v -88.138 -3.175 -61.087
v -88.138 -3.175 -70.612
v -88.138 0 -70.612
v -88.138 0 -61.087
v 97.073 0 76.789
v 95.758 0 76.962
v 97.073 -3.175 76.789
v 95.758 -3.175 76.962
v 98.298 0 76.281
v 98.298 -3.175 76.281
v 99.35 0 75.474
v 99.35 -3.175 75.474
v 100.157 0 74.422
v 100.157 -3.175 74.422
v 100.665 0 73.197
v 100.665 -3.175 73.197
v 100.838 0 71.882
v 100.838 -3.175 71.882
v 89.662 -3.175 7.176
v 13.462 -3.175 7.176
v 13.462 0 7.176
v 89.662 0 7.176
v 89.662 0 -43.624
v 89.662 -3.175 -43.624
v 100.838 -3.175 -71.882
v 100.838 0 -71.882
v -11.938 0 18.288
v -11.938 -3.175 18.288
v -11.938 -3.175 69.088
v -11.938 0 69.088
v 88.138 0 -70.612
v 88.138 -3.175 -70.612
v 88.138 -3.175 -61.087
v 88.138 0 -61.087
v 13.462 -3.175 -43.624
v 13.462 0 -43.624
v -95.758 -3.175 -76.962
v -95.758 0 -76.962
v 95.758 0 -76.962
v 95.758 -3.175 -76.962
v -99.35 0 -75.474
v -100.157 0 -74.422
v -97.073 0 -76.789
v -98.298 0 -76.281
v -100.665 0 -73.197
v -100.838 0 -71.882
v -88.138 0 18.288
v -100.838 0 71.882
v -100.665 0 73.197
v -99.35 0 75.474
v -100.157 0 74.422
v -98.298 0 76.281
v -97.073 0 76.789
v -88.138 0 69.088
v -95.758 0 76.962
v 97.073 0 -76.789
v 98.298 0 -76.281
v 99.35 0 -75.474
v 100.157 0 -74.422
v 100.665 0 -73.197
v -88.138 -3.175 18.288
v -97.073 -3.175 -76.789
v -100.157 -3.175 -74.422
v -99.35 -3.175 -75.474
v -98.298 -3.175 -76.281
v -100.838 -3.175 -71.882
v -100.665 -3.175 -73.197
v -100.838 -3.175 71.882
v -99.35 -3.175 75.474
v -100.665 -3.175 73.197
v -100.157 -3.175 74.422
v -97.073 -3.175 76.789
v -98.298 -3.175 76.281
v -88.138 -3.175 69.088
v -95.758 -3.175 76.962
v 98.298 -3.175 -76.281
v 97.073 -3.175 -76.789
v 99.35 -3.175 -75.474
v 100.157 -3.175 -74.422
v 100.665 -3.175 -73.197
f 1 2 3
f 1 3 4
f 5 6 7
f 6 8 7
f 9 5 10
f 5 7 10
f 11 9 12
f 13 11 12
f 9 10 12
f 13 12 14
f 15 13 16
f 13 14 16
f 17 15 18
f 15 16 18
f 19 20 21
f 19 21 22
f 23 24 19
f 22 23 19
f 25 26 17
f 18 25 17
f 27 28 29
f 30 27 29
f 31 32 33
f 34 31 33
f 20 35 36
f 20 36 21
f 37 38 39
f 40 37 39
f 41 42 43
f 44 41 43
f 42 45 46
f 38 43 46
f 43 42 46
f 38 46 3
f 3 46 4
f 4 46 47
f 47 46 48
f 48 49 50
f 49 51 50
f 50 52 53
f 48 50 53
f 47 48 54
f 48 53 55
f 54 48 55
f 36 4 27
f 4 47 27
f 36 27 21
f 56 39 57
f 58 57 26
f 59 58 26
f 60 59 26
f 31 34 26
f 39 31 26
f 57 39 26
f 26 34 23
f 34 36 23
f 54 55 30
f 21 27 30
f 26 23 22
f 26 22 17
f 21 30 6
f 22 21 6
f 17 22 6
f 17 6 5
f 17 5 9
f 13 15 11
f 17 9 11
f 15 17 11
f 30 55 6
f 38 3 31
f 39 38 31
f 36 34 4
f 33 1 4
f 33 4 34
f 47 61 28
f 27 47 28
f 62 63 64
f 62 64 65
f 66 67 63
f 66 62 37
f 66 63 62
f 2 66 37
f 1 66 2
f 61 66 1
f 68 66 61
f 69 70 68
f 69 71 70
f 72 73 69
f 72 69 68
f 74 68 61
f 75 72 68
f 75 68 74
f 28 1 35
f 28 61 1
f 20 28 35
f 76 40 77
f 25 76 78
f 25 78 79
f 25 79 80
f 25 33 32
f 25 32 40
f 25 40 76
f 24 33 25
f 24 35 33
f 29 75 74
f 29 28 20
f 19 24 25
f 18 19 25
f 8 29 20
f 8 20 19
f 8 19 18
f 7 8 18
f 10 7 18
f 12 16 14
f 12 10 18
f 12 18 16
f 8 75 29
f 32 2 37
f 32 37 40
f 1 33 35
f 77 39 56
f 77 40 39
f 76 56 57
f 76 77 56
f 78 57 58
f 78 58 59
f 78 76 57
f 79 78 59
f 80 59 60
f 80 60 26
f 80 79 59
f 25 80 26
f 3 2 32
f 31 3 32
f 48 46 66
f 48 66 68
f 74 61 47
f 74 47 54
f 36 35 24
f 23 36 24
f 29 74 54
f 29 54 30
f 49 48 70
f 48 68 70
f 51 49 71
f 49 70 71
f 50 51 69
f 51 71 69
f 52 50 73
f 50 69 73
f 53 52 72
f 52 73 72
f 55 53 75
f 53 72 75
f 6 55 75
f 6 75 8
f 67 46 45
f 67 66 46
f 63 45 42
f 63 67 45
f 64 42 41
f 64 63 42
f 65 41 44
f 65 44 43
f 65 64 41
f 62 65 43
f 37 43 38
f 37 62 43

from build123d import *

# Parameters (mm, degrees)
F0_W     = 201.676
F0_H     = 153.924
F1_DEPTH = 3.175
F2_W     = 76.2
F2_H     = 50.8
F3_DEPTH = 3.176
F4_W     = 176.276
F4_H     = 9.525
F5_DEPTH = 3.176
F6_R     = 5.08


with BuildPart() as f1:
    # F0 (on Front) → F1 (new body)
    with BuildSketch(Plane.XZ):
        Rectangle(F0_W, F0_H)
    extrude(amount=F1_DEPTH)

    # F2 (on face) → F3 (cut, through all)
    with BuildSketch(Plane.XZ.offset(3.175)):
        with Locations((-50.038, 43.688)):
            Rectangle(F2_W, F2_H)
        with Locations((51.562, -18.2245)):
            Rectangle(F2_W, F2_H)
    extrude(amount=-F3_DEPTH, mode=Mode.SUBTRACT)

    # F4 (on face) → F5 (cut, through all)
    with BuildSketch(Plane.XZ.offset(3.175)):
        with Locations((0, -65.8495)):
            Rectangle(F4_W, F4_H)
    extrude(amount=-F5_DEPTH, mode=Mode.SUBTRACT)

    # F6
    f6_edges = [f1.edges().sort_by_distance(p)[0] for p in [
        (100.838, -1.5875, 76.962),
        (100.838, -1.5875, -76.962),
        (-100.838, -1.5875, 76.962),
        (-100.838, -1.5875, -76.962),
    ]]
    fillet(f6_edges, radius=F6_R)


solid = f1.part
